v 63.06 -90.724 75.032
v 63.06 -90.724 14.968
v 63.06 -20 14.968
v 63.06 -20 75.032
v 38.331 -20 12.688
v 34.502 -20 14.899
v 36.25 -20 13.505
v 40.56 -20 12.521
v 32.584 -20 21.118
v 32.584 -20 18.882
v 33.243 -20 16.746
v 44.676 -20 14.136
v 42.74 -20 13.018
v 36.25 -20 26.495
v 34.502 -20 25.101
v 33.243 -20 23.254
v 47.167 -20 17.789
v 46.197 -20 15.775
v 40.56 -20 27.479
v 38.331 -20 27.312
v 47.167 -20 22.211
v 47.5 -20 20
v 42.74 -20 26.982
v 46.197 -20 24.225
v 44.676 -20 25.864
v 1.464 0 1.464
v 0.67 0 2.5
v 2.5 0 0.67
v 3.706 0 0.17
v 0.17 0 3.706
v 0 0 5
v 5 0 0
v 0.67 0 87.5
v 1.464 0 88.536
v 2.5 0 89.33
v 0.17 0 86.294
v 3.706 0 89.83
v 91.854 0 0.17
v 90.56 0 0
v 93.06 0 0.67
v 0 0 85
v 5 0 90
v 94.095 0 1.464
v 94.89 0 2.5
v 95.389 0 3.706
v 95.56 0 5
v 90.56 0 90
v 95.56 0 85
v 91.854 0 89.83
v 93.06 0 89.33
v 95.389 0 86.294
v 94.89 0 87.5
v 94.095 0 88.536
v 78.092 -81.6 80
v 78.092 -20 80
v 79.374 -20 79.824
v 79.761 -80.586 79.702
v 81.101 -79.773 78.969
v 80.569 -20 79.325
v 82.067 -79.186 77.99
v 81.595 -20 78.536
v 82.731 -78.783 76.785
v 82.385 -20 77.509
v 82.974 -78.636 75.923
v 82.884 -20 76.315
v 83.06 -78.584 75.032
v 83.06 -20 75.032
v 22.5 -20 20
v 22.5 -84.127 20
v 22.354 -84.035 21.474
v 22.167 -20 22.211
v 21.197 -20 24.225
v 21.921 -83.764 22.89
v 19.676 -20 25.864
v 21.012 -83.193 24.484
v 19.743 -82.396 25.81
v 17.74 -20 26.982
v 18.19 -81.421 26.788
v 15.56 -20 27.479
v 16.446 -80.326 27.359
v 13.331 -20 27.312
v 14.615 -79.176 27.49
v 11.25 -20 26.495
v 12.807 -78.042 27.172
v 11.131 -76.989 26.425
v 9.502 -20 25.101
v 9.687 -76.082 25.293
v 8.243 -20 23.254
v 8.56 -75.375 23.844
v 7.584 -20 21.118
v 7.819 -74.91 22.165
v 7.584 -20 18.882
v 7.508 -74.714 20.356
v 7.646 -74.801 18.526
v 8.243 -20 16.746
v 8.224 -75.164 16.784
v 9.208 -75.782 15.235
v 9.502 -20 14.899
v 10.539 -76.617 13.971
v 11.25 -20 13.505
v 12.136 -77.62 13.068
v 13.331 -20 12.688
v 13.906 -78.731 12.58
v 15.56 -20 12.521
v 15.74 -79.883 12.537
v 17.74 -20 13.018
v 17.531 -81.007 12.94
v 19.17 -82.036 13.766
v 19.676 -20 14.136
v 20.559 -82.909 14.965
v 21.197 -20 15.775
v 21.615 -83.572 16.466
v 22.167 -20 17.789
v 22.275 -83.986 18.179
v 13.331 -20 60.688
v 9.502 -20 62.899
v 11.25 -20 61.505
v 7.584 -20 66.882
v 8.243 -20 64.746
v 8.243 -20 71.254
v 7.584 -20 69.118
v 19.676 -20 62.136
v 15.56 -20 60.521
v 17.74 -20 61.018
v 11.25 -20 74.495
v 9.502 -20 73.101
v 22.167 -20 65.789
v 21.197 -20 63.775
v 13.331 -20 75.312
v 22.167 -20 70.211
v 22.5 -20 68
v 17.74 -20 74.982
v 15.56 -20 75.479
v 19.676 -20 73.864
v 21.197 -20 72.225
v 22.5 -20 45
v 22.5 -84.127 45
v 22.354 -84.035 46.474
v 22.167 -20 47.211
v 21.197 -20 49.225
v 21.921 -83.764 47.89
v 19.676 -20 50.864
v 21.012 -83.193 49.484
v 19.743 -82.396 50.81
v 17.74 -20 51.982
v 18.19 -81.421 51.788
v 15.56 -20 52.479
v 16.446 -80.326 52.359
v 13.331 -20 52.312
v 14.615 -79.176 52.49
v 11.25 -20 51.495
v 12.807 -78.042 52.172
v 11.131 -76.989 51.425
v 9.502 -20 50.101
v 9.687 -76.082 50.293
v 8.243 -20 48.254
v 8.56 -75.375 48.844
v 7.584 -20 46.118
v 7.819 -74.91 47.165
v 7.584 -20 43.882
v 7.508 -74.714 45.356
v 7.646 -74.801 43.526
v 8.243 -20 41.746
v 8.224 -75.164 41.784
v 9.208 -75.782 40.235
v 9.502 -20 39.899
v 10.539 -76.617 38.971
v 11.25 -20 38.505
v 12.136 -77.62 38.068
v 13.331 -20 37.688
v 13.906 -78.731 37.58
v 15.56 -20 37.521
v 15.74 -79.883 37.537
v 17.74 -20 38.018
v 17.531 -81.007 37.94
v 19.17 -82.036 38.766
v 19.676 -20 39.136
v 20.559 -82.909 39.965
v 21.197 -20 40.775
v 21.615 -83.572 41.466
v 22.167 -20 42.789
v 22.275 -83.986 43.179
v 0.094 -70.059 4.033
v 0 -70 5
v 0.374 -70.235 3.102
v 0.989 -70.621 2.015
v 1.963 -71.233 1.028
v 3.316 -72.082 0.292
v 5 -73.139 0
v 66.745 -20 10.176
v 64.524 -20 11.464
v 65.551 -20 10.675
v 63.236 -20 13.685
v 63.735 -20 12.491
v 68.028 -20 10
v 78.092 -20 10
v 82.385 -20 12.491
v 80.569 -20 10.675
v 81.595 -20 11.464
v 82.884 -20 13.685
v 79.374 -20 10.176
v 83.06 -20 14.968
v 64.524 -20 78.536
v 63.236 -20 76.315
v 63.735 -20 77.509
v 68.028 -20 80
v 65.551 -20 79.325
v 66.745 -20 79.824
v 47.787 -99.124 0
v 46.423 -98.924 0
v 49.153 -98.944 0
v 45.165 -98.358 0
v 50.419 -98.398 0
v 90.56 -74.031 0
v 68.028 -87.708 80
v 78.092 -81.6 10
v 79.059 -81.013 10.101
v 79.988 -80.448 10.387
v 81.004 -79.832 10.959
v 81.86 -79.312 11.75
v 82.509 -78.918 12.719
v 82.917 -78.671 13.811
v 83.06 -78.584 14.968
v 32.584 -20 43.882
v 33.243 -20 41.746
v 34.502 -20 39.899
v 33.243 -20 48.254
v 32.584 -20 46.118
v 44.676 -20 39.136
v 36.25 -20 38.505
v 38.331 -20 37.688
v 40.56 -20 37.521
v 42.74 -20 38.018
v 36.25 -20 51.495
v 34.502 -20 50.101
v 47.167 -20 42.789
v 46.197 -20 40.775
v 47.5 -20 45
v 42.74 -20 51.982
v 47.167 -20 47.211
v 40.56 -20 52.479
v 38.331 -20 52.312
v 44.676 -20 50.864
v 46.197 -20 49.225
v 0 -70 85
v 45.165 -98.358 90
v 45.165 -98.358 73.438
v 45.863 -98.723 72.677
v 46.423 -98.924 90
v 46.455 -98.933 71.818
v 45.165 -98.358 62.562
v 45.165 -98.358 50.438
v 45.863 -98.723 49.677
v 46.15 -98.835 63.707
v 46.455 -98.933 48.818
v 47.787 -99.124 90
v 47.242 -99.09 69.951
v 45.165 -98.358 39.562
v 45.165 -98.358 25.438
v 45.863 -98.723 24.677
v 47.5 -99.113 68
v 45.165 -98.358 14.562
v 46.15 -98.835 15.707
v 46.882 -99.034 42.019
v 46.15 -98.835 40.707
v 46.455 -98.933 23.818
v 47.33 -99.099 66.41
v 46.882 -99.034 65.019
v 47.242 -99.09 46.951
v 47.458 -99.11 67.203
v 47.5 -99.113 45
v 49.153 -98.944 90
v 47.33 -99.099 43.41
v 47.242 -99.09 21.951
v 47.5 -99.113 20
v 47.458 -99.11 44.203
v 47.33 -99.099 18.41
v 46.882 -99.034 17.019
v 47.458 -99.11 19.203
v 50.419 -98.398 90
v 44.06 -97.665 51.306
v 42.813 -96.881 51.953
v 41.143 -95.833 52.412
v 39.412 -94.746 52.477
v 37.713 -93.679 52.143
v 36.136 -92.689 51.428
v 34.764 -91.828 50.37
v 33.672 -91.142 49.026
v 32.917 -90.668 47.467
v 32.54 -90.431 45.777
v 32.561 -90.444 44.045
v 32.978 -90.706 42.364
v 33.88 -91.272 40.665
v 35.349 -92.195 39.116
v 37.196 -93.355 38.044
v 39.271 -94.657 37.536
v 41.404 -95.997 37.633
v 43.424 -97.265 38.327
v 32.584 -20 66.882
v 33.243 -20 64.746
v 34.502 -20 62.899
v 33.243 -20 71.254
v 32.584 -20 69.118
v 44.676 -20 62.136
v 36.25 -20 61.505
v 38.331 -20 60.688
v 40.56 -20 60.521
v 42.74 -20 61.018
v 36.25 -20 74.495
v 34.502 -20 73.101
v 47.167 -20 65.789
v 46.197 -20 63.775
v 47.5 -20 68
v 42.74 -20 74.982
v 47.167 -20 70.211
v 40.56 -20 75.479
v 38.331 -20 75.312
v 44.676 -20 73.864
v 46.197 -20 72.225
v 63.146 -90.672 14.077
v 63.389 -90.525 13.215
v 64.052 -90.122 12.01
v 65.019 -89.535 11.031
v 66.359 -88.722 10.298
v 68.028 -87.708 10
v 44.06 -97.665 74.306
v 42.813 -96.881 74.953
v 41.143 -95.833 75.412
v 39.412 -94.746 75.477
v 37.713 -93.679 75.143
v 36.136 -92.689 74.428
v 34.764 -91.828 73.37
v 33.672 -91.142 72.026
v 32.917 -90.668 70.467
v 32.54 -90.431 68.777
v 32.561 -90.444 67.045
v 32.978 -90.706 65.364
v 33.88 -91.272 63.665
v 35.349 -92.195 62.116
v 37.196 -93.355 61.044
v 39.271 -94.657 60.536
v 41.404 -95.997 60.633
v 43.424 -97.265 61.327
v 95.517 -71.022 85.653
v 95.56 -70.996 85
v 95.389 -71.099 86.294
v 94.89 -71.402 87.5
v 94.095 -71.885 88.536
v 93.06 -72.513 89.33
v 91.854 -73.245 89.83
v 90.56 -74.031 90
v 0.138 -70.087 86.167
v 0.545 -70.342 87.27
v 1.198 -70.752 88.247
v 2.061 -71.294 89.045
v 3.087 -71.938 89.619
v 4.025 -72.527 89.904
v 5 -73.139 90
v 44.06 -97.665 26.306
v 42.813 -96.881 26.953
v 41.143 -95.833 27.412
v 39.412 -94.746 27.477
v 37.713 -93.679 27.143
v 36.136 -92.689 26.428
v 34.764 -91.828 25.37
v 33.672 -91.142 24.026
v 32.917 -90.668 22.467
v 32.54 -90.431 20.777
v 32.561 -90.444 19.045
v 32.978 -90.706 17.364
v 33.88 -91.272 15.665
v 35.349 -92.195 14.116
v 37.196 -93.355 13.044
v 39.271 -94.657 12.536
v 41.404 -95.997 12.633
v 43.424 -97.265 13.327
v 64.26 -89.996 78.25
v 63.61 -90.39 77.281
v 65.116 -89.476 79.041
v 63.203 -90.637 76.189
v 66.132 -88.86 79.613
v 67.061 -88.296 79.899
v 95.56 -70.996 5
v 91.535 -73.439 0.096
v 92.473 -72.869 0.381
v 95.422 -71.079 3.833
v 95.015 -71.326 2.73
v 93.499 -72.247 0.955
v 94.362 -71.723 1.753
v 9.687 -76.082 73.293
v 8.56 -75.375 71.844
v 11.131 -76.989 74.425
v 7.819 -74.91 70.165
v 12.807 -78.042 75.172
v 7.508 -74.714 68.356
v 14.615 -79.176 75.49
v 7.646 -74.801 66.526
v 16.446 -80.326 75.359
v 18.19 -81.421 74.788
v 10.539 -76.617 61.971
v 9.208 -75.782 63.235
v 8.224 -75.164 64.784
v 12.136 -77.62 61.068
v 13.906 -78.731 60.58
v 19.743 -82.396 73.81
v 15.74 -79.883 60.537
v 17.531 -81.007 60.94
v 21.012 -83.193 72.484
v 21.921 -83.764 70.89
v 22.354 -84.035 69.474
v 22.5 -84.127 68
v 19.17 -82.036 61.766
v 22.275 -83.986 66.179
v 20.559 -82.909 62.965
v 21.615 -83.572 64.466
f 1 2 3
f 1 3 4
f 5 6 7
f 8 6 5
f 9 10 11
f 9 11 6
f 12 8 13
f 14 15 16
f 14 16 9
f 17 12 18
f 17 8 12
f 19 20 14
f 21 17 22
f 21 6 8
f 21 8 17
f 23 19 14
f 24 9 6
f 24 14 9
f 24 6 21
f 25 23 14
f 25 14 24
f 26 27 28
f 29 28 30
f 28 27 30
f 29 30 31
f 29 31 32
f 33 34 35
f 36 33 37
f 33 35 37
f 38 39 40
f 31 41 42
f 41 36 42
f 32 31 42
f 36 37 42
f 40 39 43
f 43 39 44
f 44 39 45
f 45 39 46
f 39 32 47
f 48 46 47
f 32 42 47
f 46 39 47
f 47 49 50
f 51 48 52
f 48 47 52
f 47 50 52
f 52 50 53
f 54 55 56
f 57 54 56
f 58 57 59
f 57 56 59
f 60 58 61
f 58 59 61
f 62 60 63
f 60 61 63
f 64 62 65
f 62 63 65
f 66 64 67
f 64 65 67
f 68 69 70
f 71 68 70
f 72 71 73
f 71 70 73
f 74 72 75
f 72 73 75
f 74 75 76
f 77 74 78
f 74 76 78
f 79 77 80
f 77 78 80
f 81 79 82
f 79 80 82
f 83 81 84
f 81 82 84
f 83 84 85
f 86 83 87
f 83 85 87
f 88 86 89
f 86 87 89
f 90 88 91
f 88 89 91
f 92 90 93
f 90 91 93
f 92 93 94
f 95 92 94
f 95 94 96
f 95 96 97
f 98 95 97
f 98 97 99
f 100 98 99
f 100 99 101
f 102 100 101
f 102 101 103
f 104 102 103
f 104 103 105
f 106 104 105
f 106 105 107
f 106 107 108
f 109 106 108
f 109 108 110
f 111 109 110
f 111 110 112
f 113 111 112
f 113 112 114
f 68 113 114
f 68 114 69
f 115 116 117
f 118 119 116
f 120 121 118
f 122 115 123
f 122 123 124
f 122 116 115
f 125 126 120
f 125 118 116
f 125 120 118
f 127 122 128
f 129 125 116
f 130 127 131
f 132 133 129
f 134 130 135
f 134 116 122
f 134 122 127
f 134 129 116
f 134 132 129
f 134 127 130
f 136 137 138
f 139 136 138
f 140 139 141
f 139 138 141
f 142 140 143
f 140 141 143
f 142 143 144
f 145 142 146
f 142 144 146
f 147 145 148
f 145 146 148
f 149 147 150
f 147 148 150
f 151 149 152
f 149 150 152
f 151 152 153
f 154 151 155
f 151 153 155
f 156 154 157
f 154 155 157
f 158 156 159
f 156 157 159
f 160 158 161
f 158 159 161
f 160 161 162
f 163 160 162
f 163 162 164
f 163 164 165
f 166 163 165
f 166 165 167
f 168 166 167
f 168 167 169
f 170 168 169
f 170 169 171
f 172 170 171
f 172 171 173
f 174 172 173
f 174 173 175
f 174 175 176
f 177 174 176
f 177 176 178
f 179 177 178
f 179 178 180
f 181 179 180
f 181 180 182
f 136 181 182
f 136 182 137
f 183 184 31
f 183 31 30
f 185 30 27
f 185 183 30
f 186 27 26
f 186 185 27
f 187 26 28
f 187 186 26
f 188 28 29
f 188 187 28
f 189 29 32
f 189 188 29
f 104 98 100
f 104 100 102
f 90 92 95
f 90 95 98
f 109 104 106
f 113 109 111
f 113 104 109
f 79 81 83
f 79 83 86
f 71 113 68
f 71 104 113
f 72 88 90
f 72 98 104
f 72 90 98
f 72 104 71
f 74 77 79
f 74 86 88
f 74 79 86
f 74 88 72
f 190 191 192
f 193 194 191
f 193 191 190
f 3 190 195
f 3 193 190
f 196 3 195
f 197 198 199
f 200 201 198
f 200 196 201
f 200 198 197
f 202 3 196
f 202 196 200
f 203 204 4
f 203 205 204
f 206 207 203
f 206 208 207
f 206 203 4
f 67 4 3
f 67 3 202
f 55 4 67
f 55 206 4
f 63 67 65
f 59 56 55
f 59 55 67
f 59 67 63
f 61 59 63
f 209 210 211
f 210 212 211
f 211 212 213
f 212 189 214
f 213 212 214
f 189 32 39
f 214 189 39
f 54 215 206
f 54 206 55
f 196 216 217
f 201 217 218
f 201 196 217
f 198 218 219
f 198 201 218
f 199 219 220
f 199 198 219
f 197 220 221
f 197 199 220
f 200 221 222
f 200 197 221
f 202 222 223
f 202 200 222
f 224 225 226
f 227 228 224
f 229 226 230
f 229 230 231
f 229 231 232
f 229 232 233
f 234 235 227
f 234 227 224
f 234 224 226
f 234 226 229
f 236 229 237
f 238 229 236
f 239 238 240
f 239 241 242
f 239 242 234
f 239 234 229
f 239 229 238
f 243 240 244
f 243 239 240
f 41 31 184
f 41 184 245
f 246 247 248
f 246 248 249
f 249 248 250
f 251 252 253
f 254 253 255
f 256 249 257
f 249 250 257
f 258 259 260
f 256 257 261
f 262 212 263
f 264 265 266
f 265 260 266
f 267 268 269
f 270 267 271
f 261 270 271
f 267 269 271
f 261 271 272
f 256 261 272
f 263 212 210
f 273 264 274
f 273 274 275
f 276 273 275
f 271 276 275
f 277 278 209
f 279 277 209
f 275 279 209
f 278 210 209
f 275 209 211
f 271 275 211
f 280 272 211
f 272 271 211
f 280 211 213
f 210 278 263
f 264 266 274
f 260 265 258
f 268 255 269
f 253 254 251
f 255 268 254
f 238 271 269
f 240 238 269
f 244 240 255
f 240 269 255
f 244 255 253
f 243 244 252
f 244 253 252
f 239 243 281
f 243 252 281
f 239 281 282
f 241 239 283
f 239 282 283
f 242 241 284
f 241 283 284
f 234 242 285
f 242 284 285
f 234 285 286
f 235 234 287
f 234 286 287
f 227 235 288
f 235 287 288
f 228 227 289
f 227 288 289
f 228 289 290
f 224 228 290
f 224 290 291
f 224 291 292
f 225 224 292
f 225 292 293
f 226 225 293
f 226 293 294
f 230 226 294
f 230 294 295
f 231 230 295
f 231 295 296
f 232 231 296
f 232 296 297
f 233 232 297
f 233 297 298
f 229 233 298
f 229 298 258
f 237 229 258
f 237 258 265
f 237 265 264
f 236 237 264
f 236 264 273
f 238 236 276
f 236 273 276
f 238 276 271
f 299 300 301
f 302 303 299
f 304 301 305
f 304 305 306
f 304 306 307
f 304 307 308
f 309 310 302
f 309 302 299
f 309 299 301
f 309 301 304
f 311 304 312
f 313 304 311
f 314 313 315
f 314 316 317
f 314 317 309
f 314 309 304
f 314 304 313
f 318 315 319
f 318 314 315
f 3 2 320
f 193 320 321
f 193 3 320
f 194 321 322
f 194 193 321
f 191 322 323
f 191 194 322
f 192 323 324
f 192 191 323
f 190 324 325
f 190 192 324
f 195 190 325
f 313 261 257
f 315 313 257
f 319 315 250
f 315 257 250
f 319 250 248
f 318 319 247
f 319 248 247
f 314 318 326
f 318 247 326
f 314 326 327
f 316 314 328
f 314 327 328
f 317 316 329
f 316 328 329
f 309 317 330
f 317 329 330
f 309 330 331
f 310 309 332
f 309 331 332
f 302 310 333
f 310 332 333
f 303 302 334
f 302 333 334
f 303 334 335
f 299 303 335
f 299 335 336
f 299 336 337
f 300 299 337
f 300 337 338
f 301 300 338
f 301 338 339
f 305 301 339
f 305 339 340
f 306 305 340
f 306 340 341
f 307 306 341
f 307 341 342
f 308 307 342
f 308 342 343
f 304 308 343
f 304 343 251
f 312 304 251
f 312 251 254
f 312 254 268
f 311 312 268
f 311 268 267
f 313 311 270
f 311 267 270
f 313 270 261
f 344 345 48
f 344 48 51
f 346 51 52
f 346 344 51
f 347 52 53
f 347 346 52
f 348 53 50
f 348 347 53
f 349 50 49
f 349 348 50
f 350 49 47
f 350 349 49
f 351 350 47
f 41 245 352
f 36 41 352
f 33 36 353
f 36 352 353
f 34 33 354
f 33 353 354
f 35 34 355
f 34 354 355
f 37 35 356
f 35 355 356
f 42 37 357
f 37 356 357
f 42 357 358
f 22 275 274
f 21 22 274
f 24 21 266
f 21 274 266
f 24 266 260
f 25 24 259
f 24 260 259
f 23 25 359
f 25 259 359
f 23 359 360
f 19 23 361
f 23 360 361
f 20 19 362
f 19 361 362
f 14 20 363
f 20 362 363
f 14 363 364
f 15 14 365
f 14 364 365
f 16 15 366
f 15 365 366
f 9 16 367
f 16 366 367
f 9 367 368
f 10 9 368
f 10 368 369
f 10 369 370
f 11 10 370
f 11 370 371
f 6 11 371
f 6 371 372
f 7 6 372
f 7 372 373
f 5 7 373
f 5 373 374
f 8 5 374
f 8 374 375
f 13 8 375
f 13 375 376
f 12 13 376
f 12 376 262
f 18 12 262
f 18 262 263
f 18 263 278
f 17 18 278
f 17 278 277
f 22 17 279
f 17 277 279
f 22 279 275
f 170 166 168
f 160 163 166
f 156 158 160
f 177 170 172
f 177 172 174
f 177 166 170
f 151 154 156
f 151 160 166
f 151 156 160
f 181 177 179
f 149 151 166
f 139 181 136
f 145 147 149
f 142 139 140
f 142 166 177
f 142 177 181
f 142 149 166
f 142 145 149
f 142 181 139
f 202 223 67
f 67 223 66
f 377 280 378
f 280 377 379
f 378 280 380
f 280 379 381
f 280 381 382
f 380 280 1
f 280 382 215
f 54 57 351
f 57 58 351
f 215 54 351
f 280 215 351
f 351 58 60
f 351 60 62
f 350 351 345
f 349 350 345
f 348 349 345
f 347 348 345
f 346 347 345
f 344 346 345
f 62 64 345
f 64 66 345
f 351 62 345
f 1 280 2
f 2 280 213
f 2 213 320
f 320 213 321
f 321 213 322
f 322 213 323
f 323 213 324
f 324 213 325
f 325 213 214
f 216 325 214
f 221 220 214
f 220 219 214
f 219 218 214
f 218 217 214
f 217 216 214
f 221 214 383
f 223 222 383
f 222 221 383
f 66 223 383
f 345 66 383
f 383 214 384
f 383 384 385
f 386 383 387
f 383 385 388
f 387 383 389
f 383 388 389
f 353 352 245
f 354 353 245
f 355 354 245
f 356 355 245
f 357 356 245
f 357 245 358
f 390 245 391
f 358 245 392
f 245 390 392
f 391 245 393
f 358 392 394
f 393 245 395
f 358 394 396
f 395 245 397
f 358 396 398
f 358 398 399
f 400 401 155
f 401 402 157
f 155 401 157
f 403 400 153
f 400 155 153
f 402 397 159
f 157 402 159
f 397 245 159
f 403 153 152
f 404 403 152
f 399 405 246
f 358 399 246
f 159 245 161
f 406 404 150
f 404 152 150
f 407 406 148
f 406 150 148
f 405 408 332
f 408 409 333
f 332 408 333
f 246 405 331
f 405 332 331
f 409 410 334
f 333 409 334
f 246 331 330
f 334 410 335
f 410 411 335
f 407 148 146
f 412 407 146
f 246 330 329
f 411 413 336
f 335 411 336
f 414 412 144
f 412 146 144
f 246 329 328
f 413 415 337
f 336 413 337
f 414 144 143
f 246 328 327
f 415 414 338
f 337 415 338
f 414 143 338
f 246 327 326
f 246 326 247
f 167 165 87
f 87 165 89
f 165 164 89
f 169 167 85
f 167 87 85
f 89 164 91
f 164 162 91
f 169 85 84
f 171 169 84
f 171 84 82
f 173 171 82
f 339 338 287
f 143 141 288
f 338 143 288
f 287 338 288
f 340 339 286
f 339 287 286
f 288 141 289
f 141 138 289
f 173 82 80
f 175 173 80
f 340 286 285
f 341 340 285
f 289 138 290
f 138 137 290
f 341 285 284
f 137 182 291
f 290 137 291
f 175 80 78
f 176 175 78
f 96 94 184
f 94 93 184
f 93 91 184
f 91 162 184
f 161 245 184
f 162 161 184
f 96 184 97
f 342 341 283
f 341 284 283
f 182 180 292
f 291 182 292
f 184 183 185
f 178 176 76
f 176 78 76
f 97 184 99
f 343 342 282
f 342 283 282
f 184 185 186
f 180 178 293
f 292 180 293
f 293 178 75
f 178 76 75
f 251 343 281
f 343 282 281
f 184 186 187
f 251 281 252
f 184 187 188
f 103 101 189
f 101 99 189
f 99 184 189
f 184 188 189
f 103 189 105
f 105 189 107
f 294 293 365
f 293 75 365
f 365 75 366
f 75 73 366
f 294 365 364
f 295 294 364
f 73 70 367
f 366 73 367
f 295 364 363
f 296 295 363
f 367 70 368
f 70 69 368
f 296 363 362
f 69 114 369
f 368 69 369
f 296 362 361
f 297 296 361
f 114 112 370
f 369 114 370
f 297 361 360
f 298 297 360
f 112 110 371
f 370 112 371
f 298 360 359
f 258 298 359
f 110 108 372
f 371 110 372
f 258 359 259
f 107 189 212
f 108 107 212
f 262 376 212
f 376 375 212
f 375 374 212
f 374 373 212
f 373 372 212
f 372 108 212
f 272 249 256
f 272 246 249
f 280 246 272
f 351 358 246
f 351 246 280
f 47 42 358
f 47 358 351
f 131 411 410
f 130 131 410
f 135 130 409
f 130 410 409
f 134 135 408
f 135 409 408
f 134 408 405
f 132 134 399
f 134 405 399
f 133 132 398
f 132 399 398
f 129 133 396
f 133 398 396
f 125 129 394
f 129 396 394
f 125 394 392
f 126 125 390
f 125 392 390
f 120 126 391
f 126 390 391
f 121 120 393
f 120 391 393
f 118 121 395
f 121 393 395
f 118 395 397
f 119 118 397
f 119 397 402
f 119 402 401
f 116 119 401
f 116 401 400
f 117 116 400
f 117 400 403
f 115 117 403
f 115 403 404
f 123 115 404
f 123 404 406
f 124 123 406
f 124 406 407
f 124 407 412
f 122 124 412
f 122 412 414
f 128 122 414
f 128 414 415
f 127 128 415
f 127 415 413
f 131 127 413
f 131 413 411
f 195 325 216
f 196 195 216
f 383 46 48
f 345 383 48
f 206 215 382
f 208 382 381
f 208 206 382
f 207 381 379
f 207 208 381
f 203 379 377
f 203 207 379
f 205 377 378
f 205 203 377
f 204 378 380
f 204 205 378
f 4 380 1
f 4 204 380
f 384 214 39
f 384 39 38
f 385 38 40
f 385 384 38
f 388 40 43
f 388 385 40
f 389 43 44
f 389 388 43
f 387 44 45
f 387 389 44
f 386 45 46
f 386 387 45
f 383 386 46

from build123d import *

# Parameters (mm, degrees)
F0_W        = 95.5598546359
F0_H        = 90
F1_DEPTH    = 100
F2_R        = 5
F3_W        = 20
F3_H        = 70
F3_R        = 7.5
F4_DEPTH    = 80
F5_T1_DEPTH = 92.4997500025
F7_DEPTH    = 90
F8_T1_DEPTH = 105.435292613


# Not quite as in the source:
# - a fillet or chamfer that OpenCascade refuses, or shapes differently, is made with other operations: its cross-section is extruded or revolved along the edge and cut away or added


with BuildPart() as f1:
    # F0 (on Front) → F1 (new body)
    with BuildSketch(Plane.XZ):
        with Locations((47.7799273179, 45)):
            Rectangle(F0_W, F0_H)
    extrude(amount=F1_DEPTH)

    # F2
    f2_edges = [f1.edges().sort_by_distance(p)[0] for p in [
        (95.559855, -50, 90),
        (95.559855, -50, 0),
        (0, -50, 0),
        (0, -50, 90),
    ]]
    fillet(f2_edges, radius=F2_R)

    # F3 (on face) → F4 (cut)
    with BuildSketch(Plane.XZ.offset(100)):
        with Locations((73.0598546359, 45)):
            Rectangle(F3_W, F3_H)
        with Locations((15, 45)):
            Circle(F3_R)
        with Locations((15, 68)):
            Circle(F3_R)
        with Locations((40, 45)):
            Circle(F3_R)
        with Locations((40, 68)):
            Circle(F3_R)
        with Locations((15, 20)):
            Circle(F3_R)
        with Locations((40, 20)):
            Circle(F3_R)
    extrude(amount=-F4_DEPTH, mode=Mode.SUBTRACT)

    # F5: fillet of radius 5 on 4 edges, made by hand

    # F5_s2 → F5_t1 (join)
    with BuildSketch(Plane.XZ.offset(7.5002499975)):
        with BuildLine():
            ThreePointArc((68.0597546359, 80.0001), (64.5242207299, 78.5356339059), (63.0597546359, 75.0001))
            Line((63.0597546359, 75.0001), (62.9597546359, 75.0001))
            ThreePointArc((62.9597546359, 75.0001), (62.9598546359, 77.50005), (62.9598546359, 80))
            Line((62.9598546359, 80), (63.0598546359, 80.1))
            ThreePointArc((63.0598546359, 80.1), (65.5598046359, 80.1), (68.0597546359, 80.1001))
            Line((68.0597546359, 80.1001), (68.0597546359, 80.0001))
        make_face()
        with BuildLine():
            ThreePointArc((78.0599546359, 80.0001), (81.5954885418, 78.5356339059), (83.0599546359, 75.0001))
            Line((83.0599546359, 75.0001), (83.1599546359, 75.0001))
            ThreePointArc((83.1599546359, 75.0001), (83.1598546359, 77.50005), (83.1598546359, 80))
            Line((83.1598546359, 80), (83.0598546359, 80.1))
            ThreePointArc((83.0598546359, 80.1), (80.5599046359, 80.1), (78.0599546359, 80.1001))
            Line((78.0599546359, 80.1001), (78.0599546359, 80.0001))
        make_face()
        with BuildLine():
            ThreePointArc((78.0599546359, 9.9999), (81.5954885418, 11.4643660941), (83.0599546359, 14.9999))
            Line((83.0599546359, 14.9999), (83.1599546359, 14.9999))
            ThreePointArc((83.1599546359, 14.9999), (83.1598546359, 12.49995), (83.1598546359, 10))
            Line((83.1598546359, 10), (83.0598546359, 9.9))
            ThreePointArc((83.0598546359, 9.9), (80.5599046359, 9.9), (78.0599546359, 9.8999))
            Line((78.0599546359, 9.8999), (78.0599546359, 9.9999))
        make_face()
        with BuildLine():
            ThreePointArc((63.0597546359, 14.9999), (64.5242207299, 11.4643660941), (68.0597546359, 9.9999))
            Line((68.0597546359, 9.9999), (68.0597546359, 9.8999))
            ThreePointArc((68.0597546359, 9.8999), (65.5598046359, 9.9), (63.0598546359, 9.9))
            Line((63.0598546359, 9.9), (62.9598546359, 10))
            ThreePointArc((62.9598546359, 10), (62.9598546359, 12.49995), (62.9597546359, 14.9999))
            Line((62.9597546359, 14.9999), (63.0597546359, 14.9999))
        make_face()
    extrude(amount=F5_T1_DEPTH)

    # F6 (on face) → F7 (cut)
    with BuildSketch(Plane(origin=(0, 0, 0), x_dir=(1, 0, 0), z_dir=(0, 0, -1))):
        Polygon((0, 124.7042194009), (0, 70), (47.7799273179, 100), (97.1999242902, 70), (97.1999242902, 124.7042194009), align=None)
    extrude(amount=-F7_DEPTH, mode=Mode.SUBTRACT)

    # F8: fillet of radius 5 on 1 edges, made by hand

    # F8_s2 → F8_t1 (cut)
    with BuildSketch(Plane.XY.offset(-7.7176463065)):
        with BuildLine():
            ThreePointArc((45.1654951007, -98.3584536244), (47.7865363785, -99.1238075774), (50.4188247907, -98.3980791373))
            Line((50.4188247907, -98.3980791373), (47.7799273179, -100))
            Line((47.7799273179, -100), (45.1654951007, -98.3584536244))
        make_face()
    extrude(amount=F8_T1_DEPTH, mode=Mode.SUBTRACT)


solid = f1.part
